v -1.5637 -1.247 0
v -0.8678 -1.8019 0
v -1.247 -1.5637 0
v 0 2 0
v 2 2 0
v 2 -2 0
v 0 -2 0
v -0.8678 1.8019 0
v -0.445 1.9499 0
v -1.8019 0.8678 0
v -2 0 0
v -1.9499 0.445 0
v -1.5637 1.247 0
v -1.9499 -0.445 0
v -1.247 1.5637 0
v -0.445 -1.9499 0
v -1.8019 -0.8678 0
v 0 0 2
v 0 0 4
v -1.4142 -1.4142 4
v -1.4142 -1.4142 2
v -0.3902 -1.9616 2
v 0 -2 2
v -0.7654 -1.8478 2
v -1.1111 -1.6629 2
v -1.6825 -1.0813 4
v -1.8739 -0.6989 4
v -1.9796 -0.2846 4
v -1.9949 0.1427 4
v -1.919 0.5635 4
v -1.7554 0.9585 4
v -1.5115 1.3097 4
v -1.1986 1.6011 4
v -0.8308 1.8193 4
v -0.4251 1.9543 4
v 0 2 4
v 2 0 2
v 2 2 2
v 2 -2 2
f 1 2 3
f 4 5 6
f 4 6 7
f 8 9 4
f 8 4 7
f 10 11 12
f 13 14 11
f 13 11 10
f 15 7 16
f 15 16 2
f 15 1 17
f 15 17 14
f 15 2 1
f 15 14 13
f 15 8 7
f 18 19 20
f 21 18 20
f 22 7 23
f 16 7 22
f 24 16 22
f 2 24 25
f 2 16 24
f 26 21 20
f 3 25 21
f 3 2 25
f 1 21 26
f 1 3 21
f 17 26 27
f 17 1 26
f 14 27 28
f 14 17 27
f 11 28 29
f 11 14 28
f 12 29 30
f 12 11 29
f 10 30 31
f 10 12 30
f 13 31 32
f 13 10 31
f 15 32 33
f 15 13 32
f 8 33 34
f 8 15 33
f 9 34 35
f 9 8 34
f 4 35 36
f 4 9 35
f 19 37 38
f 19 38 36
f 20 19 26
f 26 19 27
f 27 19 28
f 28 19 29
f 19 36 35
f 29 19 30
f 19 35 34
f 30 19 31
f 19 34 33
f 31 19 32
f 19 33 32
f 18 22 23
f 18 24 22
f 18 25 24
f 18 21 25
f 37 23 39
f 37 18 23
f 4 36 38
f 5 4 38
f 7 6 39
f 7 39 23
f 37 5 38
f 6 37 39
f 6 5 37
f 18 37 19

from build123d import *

# Parameters (mm, degrees)
BOSS_EXTRUDE1_DEPTH = 4
CUT_EXTRUDE2_DEPTH  = 2
CUT_EXTRUDE5_DEPTH  = 2


with BuildPart() as part:
    # Sketch1 → Boss-Extrude1 (new body)
    with BuildSketch(Plane.XY):
        with BuildLine():
            Line((0, 2), (2, 2))
            Line((2, 2), (2, -2))
            Line((2, -2), (0, -2))
            ThreePointArc((0, -2), (-2, 0), (0, 2))
        make_face()
    extrude(amount=BOSS_EXTRUDE1_DEPTH)

    # Sketch3 → Cut-Extrude2 (cut)
    with BuildSketch(Plane.XY.offset(4)):
        Polygon((2, 0), (0, 0), (-2, -2), (2, -2), align=None)
    extrude(amount=-CUT_EXTRUDE2_DEPTH, mode=Mode.SUBTRACT)

    # 3DSketch2 → Cut-Extrude5 (cut, along a direction that is not the sketch's normal)
    with BuildSketch(Plane(origin=(0, 0, 4), x_dir=(0.5773502691896283, 0.5773502691896234, -0.5773502691896257), z_dir=(-0.707106781186546, 0, -0.7071067811865491))):
        Polygon((0, 0), (2.309401077, 1.632993162), (3.464101615, 0), (1.154700538, -1.632993162), align=None)
    extrude(amount=-CUT_EXTRUDE5_DEPTH, dir=(0, 0, -1), mode=Mode.SUBTRACT)


solid = part.part
